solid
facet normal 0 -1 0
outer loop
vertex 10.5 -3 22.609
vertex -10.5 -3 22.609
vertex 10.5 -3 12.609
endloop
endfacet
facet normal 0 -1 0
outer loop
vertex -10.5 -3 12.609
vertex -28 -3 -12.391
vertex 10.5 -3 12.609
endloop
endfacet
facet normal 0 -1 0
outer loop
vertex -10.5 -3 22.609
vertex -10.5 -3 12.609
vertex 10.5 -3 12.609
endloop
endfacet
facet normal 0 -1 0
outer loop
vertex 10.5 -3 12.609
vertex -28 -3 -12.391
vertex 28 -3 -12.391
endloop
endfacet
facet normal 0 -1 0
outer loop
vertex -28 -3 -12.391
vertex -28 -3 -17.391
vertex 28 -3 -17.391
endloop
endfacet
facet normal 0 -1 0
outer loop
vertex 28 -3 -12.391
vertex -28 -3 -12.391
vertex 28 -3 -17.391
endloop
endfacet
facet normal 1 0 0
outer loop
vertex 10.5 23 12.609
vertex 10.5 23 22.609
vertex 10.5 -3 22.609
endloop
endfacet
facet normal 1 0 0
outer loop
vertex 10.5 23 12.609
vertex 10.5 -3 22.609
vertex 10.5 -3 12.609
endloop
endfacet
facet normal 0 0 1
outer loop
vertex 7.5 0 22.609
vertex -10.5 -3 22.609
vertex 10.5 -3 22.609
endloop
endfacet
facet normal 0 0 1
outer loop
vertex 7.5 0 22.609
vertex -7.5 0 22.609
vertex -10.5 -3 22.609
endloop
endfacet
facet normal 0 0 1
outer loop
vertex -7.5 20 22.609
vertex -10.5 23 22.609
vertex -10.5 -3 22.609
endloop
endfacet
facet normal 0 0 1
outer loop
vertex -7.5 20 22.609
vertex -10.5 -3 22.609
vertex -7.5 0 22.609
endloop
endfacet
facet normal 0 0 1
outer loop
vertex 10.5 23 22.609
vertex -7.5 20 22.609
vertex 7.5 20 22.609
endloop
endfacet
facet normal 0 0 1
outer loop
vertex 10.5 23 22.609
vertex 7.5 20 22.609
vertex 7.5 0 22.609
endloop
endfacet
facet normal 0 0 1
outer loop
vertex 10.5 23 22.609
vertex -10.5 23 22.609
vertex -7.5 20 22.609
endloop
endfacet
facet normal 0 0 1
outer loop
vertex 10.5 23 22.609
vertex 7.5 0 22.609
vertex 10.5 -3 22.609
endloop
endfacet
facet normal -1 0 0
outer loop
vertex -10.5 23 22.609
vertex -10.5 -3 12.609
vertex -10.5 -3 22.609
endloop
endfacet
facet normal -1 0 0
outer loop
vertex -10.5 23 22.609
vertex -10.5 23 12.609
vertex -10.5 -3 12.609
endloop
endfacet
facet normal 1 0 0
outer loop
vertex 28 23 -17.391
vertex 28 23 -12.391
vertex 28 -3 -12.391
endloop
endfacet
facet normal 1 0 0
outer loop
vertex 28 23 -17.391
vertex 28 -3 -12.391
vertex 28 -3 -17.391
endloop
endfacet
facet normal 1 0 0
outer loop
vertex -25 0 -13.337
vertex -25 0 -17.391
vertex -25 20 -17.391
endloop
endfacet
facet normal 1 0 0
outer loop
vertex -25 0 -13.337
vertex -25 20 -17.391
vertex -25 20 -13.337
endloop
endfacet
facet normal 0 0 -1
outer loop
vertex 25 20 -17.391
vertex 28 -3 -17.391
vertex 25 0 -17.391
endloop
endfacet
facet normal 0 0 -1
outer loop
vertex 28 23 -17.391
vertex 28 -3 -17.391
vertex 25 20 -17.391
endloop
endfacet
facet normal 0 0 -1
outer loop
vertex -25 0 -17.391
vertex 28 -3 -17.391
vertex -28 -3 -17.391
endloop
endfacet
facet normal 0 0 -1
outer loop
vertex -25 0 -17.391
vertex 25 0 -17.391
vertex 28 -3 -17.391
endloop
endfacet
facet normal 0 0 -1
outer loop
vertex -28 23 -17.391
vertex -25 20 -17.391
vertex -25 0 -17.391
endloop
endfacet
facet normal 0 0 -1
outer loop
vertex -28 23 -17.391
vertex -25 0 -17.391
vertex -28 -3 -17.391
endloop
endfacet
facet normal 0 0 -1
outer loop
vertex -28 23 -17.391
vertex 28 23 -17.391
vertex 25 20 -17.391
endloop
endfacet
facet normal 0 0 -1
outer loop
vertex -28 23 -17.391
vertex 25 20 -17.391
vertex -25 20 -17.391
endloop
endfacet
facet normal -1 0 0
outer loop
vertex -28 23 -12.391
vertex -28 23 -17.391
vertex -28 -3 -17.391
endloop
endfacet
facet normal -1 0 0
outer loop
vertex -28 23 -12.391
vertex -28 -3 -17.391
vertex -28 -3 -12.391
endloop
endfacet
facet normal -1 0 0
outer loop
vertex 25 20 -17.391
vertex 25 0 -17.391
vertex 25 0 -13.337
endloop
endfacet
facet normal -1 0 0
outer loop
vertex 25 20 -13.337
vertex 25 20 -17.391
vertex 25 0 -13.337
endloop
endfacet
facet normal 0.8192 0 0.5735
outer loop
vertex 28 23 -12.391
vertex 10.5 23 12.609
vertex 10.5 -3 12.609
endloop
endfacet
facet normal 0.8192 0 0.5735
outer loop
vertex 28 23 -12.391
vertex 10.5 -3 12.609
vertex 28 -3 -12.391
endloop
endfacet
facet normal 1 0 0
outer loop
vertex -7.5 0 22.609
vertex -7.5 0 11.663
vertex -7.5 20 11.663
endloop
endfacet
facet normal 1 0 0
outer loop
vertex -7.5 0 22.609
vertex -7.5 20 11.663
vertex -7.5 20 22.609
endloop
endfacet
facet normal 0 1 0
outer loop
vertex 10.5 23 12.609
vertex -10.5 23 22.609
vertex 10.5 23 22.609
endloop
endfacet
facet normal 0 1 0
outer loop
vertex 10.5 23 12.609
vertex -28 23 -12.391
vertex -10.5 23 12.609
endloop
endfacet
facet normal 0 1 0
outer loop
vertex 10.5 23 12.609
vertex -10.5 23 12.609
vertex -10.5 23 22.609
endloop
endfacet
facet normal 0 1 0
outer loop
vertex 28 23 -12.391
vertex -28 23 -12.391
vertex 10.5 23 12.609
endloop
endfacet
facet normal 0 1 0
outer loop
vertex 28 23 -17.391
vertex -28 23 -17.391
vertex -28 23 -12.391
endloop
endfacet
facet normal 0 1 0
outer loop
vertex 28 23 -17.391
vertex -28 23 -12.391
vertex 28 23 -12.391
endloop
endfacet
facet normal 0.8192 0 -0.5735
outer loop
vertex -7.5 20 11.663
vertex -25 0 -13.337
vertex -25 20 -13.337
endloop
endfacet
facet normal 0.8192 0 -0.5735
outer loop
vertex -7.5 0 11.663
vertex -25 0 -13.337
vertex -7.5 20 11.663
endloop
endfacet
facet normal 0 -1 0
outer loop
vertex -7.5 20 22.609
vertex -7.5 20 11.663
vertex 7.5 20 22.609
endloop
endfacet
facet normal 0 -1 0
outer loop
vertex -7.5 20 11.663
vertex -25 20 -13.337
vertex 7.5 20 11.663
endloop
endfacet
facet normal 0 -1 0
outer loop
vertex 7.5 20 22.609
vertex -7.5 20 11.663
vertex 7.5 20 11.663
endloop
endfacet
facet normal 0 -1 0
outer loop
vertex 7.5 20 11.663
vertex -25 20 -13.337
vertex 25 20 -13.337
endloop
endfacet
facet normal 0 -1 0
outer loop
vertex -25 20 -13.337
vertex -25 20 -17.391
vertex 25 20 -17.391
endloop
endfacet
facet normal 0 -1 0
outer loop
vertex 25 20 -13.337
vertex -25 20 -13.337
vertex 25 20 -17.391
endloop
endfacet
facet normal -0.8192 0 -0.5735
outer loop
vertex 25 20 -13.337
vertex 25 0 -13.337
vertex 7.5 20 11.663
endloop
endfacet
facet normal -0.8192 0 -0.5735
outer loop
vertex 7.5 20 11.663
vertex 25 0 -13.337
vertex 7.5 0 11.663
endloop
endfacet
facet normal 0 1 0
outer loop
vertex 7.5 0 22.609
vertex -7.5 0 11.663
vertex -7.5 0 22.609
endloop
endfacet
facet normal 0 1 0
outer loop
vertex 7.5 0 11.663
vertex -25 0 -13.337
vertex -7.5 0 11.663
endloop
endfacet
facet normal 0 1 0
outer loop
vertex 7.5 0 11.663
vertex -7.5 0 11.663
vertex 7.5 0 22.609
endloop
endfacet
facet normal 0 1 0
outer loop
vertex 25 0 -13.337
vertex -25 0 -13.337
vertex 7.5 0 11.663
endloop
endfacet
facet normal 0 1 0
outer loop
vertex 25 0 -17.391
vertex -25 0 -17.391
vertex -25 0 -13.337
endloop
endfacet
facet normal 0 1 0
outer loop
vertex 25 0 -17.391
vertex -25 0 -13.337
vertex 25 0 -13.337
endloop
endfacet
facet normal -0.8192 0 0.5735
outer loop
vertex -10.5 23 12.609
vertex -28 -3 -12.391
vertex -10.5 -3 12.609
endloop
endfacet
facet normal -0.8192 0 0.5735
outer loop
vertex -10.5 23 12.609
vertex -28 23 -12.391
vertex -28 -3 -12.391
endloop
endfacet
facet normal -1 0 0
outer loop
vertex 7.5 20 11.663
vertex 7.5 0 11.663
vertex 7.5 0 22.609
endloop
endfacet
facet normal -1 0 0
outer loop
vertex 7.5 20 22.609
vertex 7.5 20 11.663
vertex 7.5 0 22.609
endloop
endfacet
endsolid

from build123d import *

# Parameters (mm, degrees)
SALIENTE_EXTRUIR1_DEPTH   = 20
SALIENTE_EXTRUIR1_2_DEPTH = 20
SALIENTE_EXTRUIR2_DEPTH   = 3
SALIENTE_EXTRUIR3_START   = -20
SALIENTE_EXTRUIR3_DEPTH   = 3


with BuildPart() as part:
    # Croquis1 → Saliente-Extruir1 (new body)
    with BuildSketch(Plane(origin=(0, 0, 0), x_dir=(1, 0, 0), z_dir=(0, 1, 0))):
        Polygon((-25, 17.391304348), (-25, 13.33697104), (-7.5, -11.66302896), (-7.5, -22.608695652), (-10.5, -22.608695652), (-10.5, -12.608695652), (-28, 12.391304348), (-28, 17.391304348), align=None)
    extrude(amount=SALIENTE_EXTRUIR1_DEPTH)



with BuildPart() as body_2:
    # Croquis1 → Saliente-Extruir1 2 (new body)
    with BuildSketch(Plane(origin=(0, 0, 0), x_dir=(1, 0, 0), z_dir=(0, 1, 0))):
        Polygon((7.5, -11.66302896), (7.5, -22.608695652), (10.5, -22.608695652), (10.5, -12.608695652), (28, 12.391304348), (28, 17.391304348), (25, 17.391304348), (25, 13.33697104), align=None)
    extrude(amount=SALIENTE_EXTRUIR1_2_DEPTH)


with BuildPart() as part_1:
    add(part.part)

    add(body_2.part)  # Saliente-Extruir2 merges body 2
    # Croquis2 → Saliente-Extruir2 (add)
    with BuildSketch(Plane(origin=(0, 20, 0), x_dir=(1, 0, 0), z_dir=(0, 1, 0))):
        Polygon((-10.5, -22.608695652), (10.5, -22.608695652), (10.5, -12.608695652), (28, 12.391304348), (28, 17.391304348), (-28, 17.391304348), (-28, 12.391304348), (-10.5, -12.608695652), align=None)
    extrude(amount=SALIENTE_EXTRUIR2_DEPTH)

    # Croquis2<2> → Saliente-Extruir3 (add)
    with BuildSketch(Plane(origin=(0, 20, 0), x_dir=(1, 0, 0), z_dir=(0, 1, 0)).offset(SALIENTE_EXTRUIR3_START)):
        Polygon((-10.5, -22.608695652), (10.5, -22.608695652), (10.5, -12.608695652), (28, 12.391304348), (28, 17.391304348), (-28, 17.391304348), (-28, 12.391304348), (-10.5, -12.608695652), align=None)
    extrude(amount=-SALIENTE_EXTRUIR3_DEPTH)


solid = part_1.part
